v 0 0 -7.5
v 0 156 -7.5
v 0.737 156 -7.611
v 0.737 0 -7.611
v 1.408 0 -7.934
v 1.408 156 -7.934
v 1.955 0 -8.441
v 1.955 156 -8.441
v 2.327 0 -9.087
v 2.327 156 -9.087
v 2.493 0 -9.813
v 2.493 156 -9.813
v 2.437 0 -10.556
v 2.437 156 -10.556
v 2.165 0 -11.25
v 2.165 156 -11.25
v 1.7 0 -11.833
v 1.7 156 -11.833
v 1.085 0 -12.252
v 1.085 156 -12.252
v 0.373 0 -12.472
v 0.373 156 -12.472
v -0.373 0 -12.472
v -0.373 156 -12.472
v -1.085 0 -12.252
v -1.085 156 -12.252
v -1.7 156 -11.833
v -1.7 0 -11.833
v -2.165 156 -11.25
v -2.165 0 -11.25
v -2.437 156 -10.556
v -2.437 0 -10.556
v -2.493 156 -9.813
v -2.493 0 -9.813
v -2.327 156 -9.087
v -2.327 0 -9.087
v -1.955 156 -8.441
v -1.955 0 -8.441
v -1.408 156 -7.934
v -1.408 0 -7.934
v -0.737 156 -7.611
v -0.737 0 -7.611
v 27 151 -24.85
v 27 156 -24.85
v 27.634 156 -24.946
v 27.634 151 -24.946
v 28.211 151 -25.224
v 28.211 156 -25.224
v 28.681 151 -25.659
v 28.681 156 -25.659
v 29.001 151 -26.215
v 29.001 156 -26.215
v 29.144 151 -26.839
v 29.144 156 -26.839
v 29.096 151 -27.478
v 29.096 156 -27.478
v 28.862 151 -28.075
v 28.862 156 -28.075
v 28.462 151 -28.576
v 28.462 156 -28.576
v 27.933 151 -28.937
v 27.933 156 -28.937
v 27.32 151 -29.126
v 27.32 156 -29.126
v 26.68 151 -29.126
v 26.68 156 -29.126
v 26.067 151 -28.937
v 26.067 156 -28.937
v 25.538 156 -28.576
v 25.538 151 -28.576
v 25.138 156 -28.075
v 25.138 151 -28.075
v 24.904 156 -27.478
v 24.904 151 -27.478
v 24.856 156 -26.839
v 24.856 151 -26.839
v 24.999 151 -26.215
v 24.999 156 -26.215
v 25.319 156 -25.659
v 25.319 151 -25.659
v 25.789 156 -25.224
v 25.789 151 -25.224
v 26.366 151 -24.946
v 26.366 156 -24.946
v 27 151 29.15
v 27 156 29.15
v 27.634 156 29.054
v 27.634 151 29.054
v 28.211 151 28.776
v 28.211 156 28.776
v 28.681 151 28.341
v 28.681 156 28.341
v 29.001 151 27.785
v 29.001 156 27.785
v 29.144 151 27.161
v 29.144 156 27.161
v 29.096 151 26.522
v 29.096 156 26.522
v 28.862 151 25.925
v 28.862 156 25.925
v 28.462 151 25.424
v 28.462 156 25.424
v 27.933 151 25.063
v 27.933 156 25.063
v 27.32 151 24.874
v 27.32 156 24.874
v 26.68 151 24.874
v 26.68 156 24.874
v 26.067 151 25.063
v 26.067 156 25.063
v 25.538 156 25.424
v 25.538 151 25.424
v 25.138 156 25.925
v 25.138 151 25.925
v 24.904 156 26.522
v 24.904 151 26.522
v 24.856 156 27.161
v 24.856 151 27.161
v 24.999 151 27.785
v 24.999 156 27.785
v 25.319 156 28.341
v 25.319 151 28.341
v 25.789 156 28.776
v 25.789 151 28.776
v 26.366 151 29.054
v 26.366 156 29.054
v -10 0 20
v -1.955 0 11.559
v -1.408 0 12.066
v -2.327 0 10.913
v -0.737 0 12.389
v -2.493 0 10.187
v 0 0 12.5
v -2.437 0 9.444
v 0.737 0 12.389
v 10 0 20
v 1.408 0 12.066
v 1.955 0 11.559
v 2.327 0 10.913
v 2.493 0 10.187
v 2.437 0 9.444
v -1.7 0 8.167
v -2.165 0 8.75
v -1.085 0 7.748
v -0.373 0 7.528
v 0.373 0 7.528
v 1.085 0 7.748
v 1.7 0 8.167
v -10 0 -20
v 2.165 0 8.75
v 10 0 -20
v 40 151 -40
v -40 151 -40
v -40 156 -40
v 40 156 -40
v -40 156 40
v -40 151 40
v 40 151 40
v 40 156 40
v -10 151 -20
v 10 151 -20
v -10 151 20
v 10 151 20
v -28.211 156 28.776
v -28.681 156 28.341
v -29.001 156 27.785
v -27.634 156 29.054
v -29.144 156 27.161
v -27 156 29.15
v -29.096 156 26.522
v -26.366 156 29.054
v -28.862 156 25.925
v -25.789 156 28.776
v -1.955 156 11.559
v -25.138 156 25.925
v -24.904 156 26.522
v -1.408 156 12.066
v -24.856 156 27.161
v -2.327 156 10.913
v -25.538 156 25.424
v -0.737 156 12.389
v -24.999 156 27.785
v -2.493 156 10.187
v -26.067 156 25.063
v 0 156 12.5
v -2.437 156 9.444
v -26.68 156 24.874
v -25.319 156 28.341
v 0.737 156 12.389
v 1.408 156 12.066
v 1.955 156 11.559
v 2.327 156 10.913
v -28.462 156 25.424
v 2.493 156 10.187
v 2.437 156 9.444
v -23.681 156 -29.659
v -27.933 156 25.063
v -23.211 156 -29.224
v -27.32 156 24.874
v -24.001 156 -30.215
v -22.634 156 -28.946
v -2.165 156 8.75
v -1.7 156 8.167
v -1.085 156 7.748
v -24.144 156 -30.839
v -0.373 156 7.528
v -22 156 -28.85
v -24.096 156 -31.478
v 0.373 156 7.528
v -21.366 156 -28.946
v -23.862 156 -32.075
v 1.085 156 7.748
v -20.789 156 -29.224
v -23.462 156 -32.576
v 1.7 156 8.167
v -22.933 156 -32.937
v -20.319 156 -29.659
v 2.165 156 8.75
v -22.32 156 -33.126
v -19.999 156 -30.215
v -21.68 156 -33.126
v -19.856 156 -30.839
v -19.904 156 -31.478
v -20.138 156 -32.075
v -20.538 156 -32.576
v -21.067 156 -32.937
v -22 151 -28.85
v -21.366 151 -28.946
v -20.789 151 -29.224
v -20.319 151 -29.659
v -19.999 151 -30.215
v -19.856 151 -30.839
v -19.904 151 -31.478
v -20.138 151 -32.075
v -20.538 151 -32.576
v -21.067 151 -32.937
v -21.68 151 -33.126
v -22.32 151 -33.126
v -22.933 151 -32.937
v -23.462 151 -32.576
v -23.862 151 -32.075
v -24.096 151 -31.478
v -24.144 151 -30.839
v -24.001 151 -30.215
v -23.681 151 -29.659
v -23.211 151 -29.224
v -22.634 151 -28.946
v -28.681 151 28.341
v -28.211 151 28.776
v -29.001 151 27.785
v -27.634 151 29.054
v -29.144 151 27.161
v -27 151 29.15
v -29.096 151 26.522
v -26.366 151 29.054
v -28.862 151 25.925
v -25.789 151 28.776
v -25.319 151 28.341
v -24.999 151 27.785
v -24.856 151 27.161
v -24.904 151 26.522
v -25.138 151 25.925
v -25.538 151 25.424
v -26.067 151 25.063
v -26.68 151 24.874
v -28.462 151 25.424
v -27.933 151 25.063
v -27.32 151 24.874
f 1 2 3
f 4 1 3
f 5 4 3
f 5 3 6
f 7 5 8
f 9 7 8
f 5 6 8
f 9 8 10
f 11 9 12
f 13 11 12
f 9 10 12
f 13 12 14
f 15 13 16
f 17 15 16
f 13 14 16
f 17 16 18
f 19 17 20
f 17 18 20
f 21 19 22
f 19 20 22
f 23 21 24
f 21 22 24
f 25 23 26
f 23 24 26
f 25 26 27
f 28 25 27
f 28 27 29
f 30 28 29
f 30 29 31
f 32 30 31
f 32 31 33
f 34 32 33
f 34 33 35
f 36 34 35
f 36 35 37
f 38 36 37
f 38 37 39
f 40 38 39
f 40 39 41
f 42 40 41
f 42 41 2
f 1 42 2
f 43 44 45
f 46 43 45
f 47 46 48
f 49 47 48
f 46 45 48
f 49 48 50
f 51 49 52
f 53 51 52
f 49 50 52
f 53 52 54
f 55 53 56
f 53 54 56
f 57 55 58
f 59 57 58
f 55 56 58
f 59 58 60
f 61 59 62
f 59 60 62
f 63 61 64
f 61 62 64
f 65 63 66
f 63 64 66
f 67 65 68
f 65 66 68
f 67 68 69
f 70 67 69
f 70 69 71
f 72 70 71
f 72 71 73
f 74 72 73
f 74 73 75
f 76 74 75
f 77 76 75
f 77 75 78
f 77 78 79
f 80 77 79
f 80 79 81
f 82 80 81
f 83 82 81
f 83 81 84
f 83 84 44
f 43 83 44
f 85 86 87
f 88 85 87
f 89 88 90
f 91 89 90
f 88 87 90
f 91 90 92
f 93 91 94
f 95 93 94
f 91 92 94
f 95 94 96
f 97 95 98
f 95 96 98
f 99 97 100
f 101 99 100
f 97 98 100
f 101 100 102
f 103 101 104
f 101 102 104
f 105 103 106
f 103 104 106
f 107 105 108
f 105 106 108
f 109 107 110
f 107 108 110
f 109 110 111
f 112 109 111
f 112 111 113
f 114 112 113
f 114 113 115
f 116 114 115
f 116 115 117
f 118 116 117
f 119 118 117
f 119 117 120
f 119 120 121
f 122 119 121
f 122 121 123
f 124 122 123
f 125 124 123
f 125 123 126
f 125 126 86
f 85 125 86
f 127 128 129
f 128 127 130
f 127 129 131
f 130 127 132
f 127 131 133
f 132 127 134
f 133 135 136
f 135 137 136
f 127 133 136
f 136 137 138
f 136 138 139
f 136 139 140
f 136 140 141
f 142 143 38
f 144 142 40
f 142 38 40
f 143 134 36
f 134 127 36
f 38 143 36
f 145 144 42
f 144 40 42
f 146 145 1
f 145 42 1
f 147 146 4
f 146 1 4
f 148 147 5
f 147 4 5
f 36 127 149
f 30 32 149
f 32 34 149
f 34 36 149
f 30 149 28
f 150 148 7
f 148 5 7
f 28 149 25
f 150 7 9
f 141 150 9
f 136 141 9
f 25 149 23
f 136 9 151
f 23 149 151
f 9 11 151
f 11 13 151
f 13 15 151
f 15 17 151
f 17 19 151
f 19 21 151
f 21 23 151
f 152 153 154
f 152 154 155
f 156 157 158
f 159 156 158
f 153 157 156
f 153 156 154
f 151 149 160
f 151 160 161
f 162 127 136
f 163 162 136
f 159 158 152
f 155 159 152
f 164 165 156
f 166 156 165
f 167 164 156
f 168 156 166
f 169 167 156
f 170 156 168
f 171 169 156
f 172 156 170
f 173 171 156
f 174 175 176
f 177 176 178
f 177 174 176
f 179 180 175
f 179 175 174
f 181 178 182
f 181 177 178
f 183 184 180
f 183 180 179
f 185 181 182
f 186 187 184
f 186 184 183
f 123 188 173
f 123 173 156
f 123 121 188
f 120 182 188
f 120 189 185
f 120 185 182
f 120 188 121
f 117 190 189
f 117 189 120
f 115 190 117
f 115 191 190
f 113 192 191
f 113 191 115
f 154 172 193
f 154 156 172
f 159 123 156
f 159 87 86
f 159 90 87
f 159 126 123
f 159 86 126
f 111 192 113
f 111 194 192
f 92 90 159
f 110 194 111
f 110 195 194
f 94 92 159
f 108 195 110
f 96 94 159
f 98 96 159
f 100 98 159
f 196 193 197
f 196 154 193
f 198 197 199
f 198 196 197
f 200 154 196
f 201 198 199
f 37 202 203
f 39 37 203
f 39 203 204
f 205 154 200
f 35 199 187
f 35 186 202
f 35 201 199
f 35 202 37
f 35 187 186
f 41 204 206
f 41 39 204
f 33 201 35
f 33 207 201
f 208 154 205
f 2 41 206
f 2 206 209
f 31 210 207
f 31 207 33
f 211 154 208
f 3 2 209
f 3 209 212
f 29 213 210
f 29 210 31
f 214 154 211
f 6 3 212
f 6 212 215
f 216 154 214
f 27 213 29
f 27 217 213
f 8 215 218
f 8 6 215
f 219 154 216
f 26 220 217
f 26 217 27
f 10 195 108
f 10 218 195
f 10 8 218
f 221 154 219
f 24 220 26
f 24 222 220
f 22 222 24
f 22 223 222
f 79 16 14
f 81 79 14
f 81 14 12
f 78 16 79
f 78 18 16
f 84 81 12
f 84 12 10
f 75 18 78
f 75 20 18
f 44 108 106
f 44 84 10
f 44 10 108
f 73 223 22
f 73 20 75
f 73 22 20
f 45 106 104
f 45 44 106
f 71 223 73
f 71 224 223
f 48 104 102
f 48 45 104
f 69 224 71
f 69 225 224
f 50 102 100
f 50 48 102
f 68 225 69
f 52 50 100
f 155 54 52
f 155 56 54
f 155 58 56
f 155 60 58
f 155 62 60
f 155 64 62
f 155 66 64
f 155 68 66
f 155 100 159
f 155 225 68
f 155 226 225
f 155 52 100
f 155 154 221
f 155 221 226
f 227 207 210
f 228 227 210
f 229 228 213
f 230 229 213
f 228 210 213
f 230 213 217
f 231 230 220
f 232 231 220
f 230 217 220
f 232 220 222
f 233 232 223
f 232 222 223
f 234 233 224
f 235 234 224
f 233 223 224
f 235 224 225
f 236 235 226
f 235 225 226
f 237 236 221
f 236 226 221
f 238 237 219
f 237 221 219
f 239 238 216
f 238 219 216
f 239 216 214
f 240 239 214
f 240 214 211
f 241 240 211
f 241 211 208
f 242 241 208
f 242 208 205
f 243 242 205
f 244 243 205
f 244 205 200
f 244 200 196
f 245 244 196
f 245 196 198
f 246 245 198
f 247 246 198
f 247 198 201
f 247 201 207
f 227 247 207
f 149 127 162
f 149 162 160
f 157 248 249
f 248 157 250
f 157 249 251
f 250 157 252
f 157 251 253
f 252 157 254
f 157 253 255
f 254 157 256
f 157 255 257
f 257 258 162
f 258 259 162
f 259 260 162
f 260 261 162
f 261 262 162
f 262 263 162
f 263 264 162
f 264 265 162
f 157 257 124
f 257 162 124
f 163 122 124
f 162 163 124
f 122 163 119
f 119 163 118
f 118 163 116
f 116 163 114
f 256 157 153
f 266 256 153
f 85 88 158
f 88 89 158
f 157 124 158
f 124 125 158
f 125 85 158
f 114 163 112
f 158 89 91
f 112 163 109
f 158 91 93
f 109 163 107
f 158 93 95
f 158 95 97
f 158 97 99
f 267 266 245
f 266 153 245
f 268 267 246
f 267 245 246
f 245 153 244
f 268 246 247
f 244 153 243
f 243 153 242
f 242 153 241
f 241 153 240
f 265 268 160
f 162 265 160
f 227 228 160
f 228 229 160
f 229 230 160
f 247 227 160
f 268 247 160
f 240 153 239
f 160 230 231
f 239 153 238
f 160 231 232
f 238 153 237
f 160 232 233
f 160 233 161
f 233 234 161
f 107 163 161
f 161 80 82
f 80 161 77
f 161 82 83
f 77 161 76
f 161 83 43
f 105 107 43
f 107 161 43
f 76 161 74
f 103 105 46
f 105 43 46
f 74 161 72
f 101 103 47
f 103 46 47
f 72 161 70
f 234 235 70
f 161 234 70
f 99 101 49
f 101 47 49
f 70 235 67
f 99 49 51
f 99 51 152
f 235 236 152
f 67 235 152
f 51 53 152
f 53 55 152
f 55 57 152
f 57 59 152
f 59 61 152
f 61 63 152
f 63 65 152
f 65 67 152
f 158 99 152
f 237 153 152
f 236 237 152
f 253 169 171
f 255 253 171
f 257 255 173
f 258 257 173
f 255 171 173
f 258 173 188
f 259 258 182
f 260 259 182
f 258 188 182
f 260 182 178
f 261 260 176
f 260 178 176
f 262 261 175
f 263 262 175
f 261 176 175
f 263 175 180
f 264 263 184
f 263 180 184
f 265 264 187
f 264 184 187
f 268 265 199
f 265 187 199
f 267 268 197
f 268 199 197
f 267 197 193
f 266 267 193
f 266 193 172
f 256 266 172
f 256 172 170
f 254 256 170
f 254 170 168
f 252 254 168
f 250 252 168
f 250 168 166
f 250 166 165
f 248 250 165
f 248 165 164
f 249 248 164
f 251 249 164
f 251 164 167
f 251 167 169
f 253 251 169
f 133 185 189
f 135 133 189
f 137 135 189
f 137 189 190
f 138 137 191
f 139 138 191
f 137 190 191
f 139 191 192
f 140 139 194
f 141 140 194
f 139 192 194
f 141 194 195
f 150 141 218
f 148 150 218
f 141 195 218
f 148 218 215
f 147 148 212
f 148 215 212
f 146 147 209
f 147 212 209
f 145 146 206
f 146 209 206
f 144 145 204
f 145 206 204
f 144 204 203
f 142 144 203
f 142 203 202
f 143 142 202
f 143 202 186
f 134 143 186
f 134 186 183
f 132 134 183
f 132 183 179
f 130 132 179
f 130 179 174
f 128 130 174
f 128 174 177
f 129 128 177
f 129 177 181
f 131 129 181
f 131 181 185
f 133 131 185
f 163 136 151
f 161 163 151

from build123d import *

# Parameters (mm, degrees)
SKETCH1_W           = 20
SKETCH1_H           = 40
BOSS_EXTRUDE1_DEPTH = 151
SKETCH2_W           = 80
SKETCH2_H           = 80
BOSS_EXTRUDE2_DEPTH = 5
SKETCH3_R           = 2.5
CUT_EXTRUDE1_DEPTH  = 166.939748102
CUT_EXTRUDE2_REACH  = 167.94
SKETCH4_R           = 2.15


with BuildPart() as part:
    # Sketch1 → Boss-Extrude1 (new body)
    with BuildSketch(Plane(origin=(0, 0, 0), x_dir=(1, 0, 0), z_dir=(0, 1, 0))):
        Rectangle(SKETCH1_W, SKETCH1_H)
    extrude(amount=BOSS_EXTRUDE1_DEPTH)

    # Sketch2 → Boss-Extrude2 (add)
    with BuildSketch(Plane(origin=(0, 151, 0), x_dir=(1, 0, 0), z_dir=(0, 1, 0))):
        Rectangle(SKETCH2_W, SKETCH2_H)
    extrude(amount=BOSS_EXTRUDE2_DEPTH)

    # Sketch3 → Cut-Extrude1 (cut, through all)
    with BuildSketch(Plane(origin=(0, 156, 0), x_dir=(1, 0, 0), z_dir=(0, 1, 0))):
        with Locations(Location((0, 10, 0), (0, 0, 270))):
            Circle(SKETCH3_R)
        with Locations(Location((0, -10, 0), (0, 0, 270))):
            Circle(SKETCH3_R)
    extrude(amount=-CUT_EXTRUDE1_DEPTH, mode=Mode.SUBTRACT)

    # Sketch4 → Cut-Extrude2 (cut, up to next)
    with BuildSketch(Plane(origin=(0, 156, 0), x_dir=(1, 0, 0), z_dir=(0, 1, 0)), mode=Mode.PRIVATE) as cut_extrude2_sk1:
        with Locations(Location((-22, 31, 0), (0, 0, 270))):
            Circle(SKETCH4_R)
    cut_extrude2_tool1 = extrude(cut_extrude2_sk1.sketch, amount=-CUT_EXTRUDE2_REACH, mode=Mode.PRIVATE) & part.part
    # Sketch4 → Cut-Extrude2 (cut, up to next)
    with BuildSketch(Plane(origin=(0, 156, 0), x_dir=(1, 0, 0), z_dir=(0, 1, 0)), mode=Mode.PRIVATE) as cut_extrude2_sk2:
        with Locations(Location((27, 27, 0), (0, 0, 270))):
            Circle(SKETCH4_R)
    cut_extrude2_tool2 = extrude(cut_extrude2_sk2.sketch, amount=-CUT_EXTRUDE2_REACH, mode=Mode.PRIVATE) & part.part
    # Sketch4 → Cut-Extrude2 (cut, up to next)
    with BuildSketch(Plane(origin=(0, 156, 0), x_dir=(1, 0, 0), z_dir=(0, 1, 0)), mode=Mode.PRIVATE) as cut_extrude2_sk3:
        with Locations(Location((-27, -27, 0), (0, 0, 270))):
            Circle(SKETCH4_R)
    cut_extrude2_tool3 = extrude(cut_extrude2_sk3.sketch, amount=-CUT_EXTRUDE2_REACH, mode=Mode.PRIVATE) & part.part
    # Sketch4 → Cut-Extrude2 (cut, up to next)
    with BuildSketch(Plane(origin=(0, 156, 0), x_dir=(1, 0, 0), z_dir=(0, 1, 0)), mode=Mode.PRIVATE) as cut_extrude2_sk4:
        with Locations(Location((27, -27, 0), (0, 0, 270))):
            Circle(SKETCH4_R)
    cut_extrude2_tool4 = extrude(cut_extrude2_sk4.sketch, amount=-CUT_EXTRUDE2_REACH, mode=Mode.PRIVATE) & part.part
    add(cut_extrude2_tool1.solids().sort_by_distance((-22, 156, -31))[0], mode=Mode.SUBTRACT)
    add(cut_extrude2_tool2.solids().sort_by_distance((27, 156, -27))[0], mode=Mode.SUBTRACT)
    add(cut_extrude2_tool3.solids().sort_by_distance((-27, 156, 27))[0], mode=Mode.SUBTRACT)
    add(cut_extrude2_tool4.solids().sort_by_distance((27, 156, 27))[0], mode=Mode.SUBTRACT)


solid = part.part
